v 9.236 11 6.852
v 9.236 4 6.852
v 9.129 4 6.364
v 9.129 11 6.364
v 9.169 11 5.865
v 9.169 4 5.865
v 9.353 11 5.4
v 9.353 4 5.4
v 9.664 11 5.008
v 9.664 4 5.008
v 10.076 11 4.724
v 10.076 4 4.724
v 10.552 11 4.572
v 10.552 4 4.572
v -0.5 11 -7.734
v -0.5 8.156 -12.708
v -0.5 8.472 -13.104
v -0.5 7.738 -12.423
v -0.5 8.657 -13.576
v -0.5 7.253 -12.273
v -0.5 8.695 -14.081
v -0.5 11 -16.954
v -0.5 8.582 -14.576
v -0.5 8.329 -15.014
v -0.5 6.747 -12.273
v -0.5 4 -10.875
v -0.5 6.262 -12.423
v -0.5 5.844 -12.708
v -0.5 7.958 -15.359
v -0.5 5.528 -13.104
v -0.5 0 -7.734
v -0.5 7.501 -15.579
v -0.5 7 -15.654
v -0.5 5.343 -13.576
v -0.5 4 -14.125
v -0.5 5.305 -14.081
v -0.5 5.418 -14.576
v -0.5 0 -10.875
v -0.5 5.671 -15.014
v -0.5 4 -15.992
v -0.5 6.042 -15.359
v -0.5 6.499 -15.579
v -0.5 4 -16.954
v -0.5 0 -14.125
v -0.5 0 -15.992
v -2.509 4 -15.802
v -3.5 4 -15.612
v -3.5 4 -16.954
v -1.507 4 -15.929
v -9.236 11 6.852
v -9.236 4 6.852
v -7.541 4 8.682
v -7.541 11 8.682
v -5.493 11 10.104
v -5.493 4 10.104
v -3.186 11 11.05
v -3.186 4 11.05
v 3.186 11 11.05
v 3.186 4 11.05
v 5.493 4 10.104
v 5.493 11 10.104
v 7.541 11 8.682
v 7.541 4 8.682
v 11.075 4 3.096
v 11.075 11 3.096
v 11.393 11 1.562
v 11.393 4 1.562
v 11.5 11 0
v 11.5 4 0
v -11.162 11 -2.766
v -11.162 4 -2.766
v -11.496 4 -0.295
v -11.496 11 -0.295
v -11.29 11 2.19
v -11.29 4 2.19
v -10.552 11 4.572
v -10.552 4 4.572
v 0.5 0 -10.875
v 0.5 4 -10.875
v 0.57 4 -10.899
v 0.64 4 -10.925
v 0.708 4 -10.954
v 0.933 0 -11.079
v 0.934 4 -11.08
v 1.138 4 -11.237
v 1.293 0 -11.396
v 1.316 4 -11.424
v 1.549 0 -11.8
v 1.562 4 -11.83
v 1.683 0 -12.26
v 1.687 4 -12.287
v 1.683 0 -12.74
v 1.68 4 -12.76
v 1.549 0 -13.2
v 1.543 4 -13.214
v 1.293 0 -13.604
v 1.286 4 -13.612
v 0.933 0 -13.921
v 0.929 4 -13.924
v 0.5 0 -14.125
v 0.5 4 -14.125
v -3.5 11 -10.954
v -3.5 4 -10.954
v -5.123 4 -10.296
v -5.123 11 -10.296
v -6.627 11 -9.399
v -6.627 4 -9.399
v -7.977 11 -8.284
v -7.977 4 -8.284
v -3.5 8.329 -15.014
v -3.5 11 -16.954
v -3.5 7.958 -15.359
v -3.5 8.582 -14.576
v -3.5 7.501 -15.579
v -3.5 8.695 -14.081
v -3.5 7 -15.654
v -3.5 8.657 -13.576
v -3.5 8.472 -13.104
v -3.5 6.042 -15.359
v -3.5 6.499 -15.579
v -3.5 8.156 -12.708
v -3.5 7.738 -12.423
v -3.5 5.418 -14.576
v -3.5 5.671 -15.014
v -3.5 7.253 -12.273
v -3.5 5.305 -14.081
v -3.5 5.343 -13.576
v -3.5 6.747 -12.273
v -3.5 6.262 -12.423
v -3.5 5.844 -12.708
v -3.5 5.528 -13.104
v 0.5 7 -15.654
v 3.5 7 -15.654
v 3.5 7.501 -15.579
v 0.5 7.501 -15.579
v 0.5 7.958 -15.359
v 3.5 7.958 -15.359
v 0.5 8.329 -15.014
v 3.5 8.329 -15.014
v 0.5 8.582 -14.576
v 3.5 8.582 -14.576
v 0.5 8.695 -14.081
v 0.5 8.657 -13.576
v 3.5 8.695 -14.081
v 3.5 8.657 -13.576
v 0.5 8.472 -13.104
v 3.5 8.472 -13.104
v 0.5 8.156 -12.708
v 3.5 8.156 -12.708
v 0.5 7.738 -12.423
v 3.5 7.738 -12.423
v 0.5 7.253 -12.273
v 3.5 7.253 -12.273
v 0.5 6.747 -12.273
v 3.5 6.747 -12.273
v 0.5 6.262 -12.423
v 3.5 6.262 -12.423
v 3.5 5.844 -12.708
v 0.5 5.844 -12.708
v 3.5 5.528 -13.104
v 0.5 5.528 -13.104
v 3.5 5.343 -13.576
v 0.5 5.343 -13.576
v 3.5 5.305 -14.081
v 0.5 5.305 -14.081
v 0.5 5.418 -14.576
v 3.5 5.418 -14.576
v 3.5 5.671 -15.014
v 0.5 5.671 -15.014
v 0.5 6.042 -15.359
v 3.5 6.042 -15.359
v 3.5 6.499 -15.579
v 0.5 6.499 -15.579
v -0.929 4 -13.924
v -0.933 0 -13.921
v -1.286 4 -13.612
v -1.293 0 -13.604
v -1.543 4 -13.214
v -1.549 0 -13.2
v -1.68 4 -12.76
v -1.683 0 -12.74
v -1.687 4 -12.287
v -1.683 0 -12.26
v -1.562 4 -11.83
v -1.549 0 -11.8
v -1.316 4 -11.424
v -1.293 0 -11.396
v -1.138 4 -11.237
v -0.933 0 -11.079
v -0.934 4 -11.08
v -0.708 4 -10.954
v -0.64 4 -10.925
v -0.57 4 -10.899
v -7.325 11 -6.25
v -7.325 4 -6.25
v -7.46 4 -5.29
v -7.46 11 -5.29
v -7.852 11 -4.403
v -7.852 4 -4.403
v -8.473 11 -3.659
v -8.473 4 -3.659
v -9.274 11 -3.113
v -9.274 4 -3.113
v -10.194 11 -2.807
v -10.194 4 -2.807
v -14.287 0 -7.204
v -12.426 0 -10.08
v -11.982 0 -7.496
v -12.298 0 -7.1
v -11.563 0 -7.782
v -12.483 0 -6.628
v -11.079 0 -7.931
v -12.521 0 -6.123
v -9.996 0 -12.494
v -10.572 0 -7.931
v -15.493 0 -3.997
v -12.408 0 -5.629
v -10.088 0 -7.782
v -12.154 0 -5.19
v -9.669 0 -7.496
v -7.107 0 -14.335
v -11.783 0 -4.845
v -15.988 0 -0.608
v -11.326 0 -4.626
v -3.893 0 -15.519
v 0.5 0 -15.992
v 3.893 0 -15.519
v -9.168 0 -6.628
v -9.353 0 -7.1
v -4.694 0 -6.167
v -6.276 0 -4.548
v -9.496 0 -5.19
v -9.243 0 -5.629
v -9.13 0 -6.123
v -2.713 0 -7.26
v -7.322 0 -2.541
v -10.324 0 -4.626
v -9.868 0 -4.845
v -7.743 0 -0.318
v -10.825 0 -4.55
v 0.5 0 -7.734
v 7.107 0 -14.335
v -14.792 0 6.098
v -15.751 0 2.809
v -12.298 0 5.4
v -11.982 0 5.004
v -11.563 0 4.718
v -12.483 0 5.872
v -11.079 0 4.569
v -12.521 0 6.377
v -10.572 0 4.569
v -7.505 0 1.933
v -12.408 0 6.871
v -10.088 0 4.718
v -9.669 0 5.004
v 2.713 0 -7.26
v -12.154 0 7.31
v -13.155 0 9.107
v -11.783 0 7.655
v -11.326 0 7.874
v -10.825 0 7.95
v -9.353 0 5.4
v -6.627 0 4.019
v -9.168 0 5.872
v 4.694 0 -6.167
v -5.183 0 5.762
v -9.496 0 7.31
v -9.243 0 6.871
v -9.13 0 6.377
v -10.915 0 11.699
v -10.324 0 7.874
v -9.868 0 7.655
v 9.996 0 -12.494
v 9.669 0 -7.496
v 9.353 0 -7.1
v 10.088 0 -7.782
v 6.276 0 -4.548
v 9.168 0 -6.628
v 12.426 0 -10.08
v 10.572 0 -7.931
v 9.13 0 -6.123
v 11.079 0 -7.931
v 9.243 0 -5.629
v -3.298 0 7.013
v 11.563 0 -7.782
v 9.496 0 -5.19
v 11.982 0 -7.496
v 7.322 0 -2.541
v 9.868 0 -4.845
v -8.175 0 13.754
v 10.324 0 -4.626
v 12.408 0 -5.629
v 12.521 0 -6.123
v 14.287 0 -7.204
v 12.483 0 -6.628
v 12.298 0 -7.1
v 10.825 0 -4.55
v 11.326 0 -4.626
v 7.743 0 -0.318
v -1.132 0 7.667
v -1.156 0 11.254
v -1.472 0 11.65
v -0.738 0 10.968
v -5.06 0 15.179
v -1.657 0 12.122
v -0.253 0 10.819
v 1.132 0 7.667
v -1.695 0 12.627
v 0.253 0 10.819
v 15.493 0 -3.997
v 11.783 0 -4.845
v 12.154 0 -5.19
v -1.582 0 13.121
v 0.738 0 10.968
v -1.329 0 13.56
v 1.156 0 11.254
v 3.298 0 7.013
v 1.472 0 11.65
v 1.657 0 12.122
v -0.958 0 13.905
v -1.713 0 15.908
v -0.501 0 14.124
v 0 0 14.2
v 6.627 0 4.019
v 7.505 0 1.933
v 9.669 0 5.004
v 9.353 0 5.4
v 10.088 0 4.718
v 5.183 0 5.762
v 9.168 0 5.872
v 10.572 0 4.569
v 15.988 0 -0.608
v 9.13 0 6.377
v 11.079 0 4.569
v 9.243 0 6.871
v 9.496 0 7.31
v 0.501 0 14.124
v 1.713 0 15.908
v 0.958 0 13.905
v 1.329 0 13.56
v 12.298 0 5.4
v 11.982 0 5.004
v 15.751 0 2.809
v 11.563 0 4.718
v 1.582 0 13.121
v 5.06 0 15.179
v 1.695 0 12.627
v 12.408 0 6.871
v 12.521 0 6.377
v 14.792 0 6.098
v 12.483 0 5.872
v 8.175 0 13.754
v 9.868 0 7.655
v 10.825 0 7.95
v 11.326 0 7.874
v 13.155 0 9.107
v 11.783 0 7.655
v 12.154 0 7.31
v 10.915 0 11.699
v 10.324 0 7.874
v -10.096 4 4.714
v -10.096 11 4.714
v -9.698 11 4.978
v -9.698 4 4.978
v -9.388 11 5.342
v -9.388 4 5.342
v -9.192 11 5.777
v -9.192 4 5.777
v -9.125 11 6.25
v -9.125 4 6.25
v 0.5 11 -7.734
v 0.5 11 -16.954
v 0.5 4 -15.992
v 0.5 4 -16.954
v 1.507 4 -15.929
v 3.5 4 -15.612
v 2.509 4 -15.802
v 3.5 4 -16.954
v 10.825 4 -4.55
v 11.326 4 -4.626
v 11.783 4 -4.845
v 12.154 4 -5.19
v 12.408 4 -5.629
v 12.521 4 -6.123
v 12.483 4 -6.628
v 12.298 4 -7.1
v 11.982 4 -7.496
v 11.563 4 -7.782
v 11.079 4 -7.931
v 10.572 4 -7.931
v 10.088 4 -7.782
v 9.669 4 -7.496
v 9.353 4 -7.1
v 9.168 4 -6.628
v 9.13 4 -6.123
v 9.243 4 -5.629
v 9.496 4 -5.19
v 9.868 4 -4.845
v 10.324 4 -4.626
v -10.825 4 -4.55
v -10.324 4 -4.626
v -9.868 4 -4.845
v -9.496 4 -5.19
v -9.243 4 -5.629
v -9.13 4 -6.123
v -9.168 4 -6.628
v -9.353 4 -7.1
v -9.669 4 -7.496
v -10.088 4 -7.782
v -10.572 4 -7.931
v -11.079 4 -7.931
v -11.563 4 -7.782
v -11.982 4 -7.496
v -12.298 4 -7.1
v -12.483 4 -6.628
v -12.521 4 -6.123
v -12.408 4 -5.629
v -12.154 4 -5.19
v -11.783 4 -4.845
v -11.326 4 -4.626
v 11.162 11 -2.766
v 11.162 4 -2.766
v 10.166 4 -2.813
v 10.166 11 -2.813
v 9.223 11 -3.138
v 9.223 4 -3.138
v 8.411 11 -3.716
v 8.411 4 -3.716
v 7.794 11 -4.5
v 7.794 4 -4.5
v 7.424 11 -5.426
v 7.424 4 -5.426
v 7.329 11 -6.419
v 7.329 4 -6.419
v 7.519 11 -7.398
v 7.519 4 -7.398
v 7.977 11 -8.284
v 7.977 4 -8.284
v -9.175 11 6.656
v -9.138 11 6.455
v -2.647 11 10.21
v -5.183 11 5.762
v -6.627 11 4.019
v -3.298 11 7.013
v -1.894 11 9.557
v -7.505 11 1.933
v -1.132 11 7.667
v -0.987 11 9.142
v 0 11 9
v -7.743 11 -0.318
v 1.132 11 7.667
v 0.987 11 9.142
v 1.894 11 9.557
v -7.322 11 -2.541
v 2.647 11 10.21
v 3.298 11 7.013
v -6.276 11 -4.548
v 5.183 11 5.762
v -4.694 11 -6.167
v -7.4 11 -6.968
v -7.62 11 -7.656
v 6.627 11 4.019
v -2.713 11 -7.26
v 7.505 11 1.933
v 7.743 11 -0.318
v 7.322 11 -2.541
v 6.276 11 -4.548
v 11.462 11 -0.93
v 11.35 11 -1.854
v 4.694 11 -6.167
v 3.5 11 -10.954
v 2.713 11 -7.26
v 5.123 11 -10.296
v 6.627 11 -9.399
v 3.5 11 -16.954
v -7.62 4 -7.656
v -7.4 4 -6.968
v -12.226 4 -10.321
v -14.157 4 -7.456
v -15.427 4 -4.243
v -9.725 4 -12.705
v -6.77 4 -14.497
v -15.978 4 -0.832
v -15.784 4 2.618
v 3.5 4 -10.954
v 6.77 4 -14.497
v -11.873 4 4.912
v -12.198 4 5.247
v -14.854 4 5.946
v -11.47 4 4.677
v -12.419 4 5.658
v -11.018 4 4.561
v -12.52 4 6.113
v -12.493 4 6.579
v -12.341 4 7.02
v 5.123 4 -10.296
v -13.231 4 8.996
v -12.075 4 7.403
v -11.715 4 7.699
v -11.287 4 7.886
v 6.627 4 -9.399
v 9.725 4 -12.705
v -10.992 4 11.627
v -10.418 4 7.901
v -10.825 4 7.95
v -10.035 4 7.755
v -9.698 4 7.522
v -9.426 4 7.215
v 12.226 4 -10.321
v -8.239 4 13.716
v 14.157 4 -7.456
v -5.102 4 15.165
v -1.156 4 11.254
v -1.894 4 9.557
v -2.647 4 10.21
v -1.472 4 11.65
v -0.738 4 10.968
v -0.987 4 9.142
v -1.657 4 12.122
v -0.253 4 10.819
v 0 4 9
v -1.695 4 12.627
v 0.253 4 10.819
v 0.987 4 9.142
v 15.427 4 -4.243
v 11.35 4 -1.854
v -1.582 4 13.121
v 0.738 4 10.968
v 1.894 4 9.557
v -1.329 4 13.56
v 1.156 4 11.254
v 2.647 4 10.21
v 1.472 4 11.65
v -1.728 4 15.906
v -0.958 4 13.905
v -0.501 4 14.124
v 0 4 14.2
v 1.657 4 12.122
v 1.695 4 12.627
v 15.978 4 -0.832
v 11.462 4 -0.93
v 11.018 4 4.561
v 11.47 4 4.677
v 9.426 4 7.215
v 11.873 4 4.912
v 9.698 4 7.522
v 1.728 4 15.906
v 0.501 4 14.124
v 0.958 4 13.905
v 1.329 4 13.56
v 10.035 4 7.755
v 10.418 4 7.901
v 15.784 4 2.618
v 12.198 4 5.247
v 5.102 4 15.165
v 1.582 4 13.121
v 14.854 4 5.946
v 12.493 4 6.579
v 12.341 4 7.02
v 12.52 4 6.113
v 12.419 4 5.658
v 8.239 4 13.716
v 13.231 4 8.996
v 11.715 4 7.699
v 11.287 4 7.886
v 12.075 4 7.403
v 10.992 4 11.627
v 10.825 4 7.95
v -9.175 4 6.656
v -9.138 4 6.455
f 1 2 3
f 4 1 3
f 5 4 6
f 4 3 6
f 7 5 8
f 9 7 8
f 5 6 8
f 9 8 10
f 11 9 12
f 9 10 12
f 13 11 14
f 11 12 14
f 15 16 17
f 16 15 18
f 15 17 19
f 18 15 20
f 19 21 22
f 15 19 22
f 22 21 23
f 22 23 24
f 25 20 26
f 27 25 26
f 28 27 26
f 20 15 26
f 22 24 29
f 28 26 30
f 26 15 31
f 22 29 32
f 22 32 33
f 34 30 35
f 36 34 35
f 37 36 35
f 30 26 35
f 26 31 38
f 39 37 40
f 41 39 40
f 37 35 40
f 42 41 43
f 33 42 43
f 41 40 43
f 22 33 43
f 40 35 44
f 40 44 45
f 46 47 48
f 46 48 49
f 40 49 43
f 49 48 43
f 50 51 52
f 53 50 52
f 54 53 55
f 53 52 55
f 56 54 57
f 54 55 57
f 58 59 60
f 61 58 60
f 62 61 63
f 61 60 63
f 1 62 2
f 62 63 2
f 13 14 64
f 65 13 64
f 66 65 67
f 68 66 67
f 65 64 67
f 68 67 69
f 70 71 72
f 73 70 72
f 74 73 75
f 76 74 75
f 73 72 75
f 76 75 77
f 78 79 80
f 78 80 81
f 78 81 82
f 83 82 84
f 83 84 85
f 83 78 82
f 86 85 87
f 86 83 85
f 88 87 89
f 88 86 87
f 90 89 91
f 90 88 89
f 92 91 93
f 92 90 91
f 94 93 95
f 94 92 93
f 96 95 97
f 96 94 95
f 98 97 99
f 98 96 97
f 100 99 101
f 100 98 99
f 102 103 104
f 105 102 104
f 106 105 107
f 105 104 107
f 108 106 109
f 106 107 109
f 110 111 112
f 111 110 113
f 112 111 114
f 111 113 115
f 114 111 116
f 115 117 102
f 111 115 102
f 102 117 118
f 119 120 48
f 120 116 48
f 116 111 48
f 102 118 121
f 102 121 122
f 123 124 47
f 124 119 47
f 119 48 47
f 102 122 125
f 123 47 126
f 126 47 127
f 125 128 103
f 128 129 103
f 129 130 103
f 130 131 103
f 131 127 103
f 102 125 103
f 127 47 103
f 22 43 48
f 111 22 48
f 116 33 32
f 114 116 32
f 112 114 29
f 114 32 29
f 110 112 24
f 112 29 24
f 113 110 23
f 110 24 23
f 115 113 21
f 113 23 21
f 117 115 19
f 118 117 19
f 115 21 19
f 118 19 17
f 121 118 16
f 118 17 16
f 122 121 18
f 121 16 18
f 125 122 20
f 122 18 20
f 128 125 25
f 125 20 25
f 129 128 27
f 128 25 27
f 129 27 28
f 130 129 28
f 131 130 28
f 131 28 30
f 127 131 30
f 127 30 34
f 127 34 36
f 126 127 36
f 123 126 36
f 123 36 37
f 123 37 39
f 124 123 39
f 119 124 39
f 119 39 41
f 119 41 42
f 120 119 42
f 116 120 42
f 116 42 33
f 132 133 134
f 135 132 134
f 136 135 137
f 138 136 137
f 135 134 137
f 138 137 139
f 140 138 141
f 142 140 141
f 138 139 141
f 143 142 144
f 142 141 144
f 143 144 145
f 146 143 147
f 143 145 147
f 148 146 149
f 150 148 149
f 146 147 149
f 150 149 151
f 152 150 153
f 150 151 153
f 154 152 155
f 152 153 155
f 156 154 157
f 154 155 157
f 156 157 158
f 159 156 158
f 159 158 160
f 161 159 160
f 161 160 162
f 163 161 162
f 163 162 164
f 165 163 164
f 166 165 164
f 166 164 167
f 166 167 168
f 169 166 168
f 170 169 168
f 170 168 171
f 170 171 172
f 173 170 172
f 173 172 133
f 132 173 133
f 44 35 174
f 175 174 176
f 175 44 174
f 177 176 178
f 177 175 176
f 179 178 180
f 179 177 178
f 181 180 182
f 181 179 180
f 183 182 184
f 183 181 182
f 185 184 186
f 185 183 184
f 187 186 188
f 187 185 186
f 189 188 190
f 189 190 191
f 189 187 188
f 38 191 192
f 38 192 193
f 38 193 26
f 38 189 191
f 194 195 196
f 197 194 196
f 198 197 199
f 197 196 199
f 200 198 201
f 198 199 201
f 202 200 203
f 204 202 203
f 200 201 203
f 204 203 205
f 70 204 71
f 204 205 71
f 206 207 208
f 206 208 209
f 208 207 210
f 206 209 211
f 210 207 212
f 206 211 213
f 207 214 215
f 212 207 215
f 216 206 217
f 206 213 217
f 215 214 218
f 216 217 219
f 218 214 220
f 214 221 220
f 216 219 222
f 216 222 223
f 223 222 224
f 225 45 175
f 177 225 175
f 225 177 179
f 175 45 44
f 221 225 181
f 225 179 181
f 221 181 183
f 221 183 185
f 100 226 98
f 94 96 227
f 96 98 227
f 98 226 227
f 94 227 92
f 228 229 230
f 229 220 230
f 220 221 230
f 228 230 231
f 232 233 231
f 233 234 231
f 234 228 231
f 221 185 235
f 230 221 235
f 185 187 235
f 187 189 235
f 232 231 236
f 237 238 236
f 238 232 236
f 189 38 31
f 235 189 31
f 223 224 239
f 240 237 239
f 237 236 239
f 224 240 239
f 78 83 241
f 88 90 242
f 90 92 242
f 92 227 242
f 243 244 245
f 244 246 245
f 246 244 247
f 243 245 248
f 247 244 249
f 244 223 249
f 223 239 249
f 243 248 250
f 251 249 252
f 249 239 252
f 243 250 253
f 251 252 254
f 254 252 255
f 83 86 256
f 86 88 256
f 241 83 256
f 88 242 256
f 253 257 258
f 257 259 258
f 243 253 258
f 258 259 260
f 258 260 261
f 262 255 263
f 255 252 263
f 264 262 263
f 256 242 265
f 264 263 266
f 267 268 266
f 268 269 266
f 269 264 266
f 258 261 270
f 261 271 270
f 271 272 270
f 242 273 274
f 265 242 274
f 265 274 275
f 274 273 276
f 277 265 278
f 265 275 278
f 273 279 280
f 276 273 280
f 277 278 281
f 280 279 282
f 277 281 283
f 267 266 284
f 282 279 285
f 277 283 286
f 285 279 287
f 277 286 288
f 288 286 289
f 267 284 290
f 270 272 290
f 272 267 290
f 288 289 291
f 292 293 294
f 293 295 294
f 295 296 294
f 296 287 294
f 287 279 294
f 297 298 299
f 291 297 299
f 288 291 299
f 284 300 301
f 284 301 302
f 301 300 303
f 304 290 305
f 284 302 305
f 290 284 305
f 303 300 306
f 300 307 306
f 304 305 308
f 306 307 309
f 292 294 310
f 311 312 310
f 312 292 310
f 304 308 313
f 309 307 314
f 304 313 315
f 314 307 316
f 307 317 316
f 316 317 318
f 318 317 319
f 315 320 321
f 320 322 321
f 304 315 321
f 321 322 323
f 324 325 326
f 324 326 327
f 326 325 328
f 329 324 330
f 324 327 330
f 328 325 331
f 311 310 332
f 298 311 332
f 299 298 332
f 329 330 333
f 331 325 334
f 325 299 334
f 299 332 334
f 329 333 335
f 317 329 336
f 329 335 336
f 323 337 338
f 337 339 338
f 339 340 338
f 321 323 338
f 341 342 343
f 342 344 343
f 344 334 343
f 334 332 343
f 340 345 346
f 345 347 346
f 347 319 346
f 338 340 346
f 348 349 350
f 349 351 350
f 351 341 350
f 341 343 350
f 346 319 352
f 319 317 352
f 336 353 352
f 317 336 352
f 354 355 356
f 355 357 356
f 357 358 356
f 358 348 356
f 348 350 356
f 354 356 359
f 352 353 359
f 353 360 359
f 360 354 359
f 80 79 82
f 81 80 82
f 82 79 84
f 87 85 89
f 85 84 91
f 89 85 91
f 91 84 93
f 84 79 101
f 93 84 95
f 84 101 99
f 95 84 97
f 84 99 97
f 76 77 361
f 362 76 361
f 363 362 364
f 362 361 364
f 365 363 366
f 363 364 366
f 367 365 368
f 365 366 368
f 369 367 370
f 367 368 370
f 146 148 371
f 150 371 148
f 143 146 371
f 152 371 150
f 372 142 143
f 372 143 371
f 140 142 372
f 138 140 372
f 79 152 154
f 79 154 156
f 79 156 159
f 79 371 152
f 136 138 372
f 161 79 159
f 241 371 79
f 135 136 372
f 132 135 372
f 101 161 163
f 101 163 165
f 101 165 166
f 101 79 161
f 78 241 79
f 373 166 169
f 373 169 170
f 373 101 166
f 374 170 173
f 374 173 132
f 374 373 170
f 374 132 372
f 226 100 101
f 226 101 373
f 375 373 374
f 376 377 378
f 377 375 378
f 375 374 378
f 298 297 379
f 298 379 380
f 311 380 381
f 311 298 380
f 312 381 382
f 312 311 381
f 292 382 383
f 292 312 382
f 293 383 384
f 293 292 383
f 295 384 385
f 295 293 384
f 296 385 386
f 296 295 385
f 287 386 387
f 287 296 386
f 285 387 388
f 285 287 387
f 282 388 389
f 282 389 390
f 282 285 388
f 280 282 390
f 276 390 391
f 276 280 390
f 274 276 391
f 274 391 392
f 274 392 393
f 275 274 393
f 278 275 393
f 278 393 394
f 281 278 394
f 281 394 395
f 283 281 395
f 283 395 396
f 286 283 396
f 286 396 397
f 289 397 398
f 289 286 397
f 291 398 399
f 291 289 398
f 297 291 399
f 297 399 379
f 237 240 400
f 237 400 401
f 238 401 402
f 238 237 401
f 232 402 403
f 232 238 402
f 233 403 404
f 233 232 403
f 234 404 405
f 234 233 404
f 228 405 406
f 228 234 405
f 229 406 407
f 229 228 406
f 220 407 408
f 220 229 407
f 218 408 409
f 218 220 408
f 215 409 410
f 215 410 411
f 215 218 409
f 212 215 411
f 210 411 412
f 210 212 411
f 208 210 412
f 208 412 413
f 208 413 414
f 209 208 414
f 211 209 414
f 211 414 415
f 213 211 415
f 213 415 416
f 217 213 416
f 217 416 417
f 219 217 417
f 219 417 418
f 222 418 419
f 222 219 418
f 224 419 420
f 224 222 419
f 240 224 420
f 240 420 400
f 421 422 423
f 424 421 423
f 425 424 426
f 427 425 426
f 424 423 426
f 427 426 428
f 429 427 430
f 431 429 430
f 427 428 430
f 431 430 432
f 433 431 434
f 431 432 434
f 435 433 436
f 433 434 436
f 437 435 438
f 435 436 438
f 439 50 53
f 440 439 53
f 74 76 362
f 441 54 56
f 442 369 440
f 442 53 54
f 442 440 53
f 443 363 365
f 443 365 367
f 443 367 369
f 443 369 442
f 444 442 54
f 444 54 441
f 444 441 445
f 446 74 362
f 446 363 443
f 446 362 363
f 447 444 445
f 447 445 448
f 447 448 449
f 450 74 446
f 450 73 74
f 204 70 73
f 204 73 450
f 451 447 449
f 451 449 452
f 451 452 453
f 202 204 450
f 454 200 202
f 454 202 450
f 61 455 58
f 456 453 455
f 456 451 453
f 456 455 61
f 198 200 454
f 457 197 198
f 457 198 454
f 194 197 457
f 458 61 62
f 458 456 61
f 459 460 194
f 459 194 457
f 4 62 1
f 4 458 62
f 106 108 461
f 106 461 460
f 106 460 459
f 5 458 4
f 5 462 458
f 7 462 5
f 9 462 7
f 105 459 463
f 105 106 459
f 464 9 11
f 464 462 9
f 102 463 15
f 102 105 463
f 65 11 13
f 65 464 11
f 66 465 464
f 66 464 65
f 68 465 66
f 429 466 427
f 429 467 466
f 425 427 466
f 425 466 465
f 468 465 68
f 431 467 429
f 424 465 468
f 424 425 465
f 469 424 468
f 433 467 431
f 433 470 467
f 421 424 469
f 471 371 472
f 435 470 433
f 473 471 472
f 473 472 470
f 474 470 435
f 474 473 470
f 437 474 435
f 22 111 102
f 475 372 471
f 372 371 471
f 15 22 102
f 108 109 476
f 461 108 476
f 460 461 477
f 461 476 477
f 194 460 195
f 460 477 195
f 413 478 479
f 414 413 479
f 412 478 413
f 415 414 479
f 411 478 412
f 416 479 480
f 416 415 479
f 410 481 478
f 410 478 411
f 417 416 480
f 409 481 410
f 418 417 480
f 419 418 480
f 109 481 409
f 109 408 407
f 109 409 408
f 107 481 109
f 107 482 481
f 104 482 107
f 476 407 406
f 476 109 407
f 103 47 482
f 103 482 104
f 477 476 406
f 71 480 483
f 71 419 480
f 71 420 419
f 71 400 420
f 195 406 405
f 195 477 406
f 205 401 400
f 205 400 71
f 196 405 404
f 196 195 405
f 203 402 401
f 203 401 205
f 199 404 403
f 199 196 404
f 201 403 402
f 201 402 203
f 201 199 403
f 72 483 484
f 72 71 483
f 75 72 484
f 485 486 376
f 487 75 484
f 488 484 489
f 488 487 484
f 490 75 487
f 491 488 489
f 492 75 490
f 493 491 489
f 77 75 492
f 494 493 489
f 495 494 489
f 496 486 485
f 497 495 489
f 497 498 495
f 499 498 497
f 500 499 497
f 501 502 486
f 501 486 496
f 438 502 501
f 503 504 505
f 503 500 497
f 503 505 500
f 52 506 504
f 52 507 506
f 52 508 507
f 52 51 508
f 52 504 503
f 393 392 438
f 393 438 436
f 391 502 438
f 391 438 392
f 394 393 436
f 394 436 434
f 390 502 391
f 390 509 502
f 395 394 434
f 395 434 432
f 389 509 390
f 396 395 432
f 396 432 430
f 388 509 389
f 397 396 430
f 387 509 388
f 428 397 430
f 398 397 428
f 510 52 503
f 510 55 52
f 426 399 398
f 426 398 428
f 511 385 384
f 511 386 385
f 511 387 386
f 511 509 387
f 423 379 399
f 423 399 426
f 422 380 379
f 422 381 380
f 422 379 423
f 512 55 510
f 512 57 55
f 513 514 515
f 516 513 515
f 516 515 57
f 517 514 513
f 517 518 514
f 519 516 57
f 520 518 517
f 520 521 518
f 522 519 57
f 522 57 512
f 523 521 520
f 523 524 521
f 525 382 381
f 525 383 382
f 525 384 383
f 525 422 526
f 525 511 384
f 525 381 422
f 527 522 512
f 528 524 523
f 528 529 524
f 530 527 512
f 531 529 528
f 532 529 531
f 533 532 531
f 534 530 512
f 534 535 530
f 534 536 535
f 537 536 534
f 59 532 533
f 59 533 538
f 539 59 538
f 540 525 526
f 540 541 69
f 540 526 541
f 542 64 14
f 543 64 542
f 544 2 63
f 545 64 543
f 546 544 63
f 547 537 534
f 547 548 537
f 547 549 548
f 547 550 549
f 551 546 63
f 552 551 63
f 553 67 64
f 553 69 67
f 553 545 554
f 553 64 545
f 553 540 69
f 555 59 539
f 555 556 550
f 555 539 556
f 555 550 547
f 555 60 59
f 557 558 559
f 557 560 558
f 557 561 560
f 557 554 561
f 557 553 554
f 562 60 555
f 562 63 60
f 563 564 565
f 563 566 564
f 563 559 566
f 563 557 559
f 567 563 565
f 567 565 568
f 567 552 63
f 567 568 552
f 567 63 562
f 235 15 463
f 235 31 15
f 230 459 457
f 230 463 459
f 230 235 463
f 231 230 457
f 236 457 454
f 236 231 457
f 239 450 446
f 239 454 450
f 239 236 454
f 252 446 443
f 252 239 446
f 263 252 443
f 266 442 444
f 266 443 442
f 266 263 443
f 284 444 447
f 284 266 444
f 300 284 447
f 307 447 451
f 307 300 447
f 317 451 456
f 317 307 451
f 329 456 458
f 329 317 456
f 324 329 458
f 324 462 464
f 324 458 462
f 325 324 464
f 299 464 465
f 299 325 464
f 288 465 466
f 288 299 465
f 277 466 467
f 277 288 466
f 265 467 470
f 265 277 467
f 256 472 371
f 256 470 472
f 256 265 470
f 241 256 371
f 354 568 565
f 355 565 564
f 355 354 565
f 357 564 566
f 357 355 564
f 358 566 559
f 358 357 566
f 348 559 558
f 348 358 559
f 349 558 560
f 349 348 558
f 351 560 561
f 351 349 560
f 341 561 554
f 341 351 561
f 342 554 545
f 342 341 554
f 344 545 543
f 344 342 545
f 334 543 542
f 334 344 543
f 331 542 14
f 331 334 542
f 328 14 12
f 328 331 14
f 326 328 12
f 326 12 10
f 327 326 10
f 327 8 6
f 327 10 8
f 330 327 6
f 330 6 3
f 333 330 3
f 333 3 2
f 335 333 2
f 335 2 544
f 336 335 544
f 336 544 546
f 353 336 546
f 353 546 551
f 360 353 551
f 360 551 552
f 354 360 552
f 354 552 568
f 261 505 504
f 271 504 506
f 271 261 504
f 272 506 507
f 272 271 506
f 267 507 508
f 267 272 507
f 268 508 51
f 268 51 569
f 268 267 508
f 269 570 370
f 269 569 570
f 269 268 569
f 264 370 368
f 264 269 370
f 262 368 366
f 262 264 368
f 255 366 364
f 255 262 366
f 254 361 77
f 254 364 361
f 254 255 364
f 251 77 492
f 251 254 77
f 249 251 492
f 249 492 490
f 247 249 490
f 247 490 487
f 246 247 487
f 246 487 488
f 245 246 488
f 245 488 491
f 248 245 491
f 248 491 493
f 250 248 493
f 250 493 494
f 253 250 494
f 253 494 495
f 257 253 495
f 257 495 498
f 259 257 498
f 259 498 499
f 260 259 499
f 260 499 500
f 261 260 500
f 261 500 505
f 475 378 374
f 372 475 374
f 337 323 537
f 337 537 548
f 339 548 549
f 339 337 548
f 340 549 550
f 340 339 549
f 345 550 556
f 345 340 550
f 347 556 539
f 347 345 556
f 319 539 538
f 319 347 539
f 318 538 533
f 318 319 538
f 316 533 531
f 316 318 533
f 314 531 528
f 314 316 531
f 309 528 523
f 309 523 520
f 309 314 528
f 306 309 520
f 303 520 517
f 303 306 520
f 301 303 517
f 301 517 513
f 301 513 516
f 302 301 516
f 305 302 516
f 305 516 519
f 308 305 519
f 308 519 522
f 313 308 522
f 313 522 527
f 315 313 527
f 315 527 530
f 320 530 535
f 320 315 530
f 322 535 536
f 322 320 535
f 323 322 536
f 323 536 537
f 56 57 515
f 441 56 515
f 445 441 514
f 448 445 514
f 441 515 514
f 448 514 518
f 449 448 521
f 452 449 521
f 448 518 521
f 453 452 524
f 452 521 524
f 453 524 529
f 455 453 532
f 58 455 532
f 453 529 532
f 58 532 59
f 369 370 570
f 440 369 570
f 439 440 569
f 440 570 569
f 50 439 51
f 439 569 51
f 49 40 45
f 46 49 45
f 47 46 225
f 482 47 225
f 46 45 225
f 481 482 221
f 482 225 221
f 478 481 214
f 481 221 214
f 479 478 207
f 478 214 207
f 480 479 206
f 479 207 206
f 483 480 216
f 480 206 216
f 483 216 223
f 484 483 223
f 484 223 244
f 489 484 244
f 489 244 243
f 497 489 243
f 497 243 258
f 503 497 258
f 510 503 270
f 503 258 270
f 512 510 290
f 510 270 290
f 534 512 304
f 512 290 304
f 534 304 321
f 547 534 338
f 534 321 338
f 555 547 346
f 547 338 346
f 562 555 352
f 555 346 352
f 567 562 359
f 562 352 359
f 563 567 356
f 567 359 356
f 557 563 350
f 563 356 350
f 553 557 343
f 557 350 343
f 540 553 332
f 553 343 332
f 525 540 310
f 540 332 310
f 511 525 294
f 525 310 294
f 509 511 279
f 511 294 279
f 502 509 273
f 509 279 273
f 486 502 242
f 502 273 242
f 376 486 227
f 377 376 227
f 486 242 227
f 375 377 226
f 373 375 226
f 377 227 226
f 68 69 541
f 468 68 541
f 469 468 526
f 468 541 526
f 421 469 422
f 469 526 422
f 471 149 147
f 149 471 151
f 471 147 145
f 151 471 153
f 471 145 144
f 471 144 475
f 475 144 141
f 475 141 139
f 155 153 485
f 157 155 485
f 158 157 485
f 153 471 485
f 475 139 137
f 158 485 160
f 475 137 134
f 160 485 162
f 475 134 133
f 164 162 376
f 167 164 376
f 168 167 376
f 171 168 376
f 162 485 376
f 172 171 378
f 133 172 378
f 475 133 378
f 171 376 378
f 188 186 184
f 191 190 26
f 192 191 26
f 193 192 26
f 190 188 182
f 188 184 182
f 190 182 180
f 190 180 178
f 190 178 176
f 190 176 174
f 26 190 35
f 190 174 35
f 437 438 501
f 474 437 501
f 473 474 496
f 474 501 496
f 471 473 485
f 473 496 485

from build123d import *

# Parameters (mm, degrees)
SKETCH_1_R          = 16
SKETCH_1_R_2        = 7.75
SKETCH_1_R_3        = 1.7
EXTRUDE_1_DEPTH     = 4
SKETCH_2_R          = 7.75
EXTRUDE_2_DEPTH     = 7
CUT_EXTRUDE_START   = -11
SKETCH_3_W          = 1
SKETCH_3_H          = 8.04554885
SKETCH_3_H_2        = 6
CUT_EXTRUDE_1_DEPTH = 11
EXTRUDE_START       = -7
EXTRUDE_3_DEPTH     = 7
SKETCH_4_R          = 1.7
CUT_EXTRUDE_2_DEPTH = 8


with BuildPart() as part:
    # 草图1 → 凸台-拉伸1 (new body)
    with BuildSketch(Plane(origin=(0, 0, 0), x_dir=(1, 0, 0), z_dir=(0, 1, 0))):
        with Locations(Location((0, 0, 0), (0, 0, 270))):
            Circle(SKETCH_1_R)
        with Locations(Location((0, 0, 0), (0, 0, 270))):
            Circle(SKETCH_1_R_2, mode=Mode.SUBTRACT)
        with Locations(Location((0, 12.5, 0), (0, 0, 270))):
            Circle(SKETCH_1_R_3, mode=Mode.SUBTRACT)
        with Locations(Location((10.825317547, 6.25, 0), (0, 0, 270))):
            Circle(SKETCH_1_R_3, mode=Mode.SUBTRACT)
        with Locations(Location((10.825317547, -6.25, 0), (0, 0, 270))):
            Circle(SKETCH_1_R_3, mode=Mode.SUBTRACT)
        with Locations(Location((0, -12.5, 0), (0, 0, 270))):
            Circle(SKETCH_1_R_3, mode=Mode.SUBTRACT)
        with Locations(Location((-10.825317547, -6.25, 0), (0, 0, 270))):
            Circle(SKETCH_1_R_3, mode=Mode.SUBTRACT)
        with Locations(Location((-10.825317547, 6.25, 0), (0, 0, 270))):
            Circle(SKETCH_1_R_3, mode=Mode.SUBTRACT)
    extrude(amount=EXTRUDE_1_DEPTH)

    # 草图2 → 凸台-拉伸2 (add)
    with BuildSketch(Plane(origin=(0, 4, 0), x_dir=(1, 0, 0), z_dir=(0, 1, 0))):
        with BuildLine():
            ThreePointArc((-3.185514087, -11.05), (0, -9), (3.185514087, -11.05))
            ThreePointArc((3.185514087, -11.05), (6.555617772, -9.448485362), (9.23558726, -6.852293628))
            ThreePointArc((9.23558726, -6.852293628), (9.353074361, -5.4), (10.552053986, -4.572106372))
            ThreePointArc((10.552053986, -4.572106372), (11.260519989, -2.334671193), (11.5, 0))
            ThreePointArc((11.5, 0), (11.415272318, 1.393397971), (11.162337755, 2.766263876))
            ThreePointArc((11.162337755, 2.766263876), (7.794228634, 4.5), (7.976823668, 8.283736124))
            ThreePointArc((7.976823668, 8.283736124), (4.904819465, 10.401574209), (1.316466726, 11.4244))
            ThreePointArc((1.316466726, 11.4244), (0, 10.8), (-1.316466726, 11.4244))
            ThreePointArc((-1.316466726, 11.4244), (-4.904819465, 10.401574209), (-7.976823668, 8.283736124))
            ThreePointArc((-7.976823668, 8.283736124), (-7.492171243, 7.317771376), (-7.325317547, 6.25))
            ThreePointArc((-7.325317547, 6.25), (-8.472613861, 3.658709711), (-11.162337755, 2.766263876))
            ThreePointArc((-11.162337755, 2.766263876), (-11.460437236, -0.953088847), (-10.552053986, -4.572106372))
            ThreePointArc((-10.552053986, -4.572106372), (-9.530221401, -5.148761619), (-9.125317547, -6.25))
            ThreePointArc((-9.125317547, -6.25), (-9.153112194, -6.556152341), (-9.23558726, -6.852293628))
            ThreePointArc((-9.23558726, -6.852293628), (-6.555617772, -9.448485362), (-3.185514087, -11.05))
        make_face()
        with Locations(Location((0, 0, 0), (0, 0, 270))):
            Circle(SKETCH_2_R, mode=Mode.SUBTRACT)
    extrude(amount=EXTRUDE_2_DEPTH)

    # 草图3 → 切除-拉伸1 (cut)
    with BuildSketch(Plane(origin=(0, 11, 0), x_dir=(1, 0, 0), z_dir=(0, 1, 0)).offset(CUT_EXTRUDE_START)):
        with BuildLine():
            Line((0.5, -7.733854149), (0.5, 0))
            Line((0.5, 0), (-0.5, 0))
            Line((-0.5, 0), (-0.5, -7.733854149))
            ThreePointArc((-0.5, -7.733854149), (0, -7.75), (0.5, -7.733854149))
        make_face()
        with BuildLine():
            Line((-0.5, 0), (0.5, 0))
            Line((0.5, 0), (0.5, 7.733854149))
            ThreePointArc((0.5, 7.733854149), (0, 7.75), (-0.5, 7.733854149))
            Line((-0.5, 7.733854149), (-0.5, 0))
        make_face()
        with Locations((0, 20.977225575)):
            Rectangle(SKETCH_3_W, SKETCH_3_H)
        with Locations((0, 13.95445115)):
            Rectangle(SKETCH_3_W, SKETCH_3_H_2)
        with BuildLine():
            ThreePointArc((-0.5, 7.733854149), (0, 7.75), (0.5, 7.733854149))
            Line((0.5, 7.733854149), (0.5, 10.875192319))
            ThreePointArc((0.5, 10.875192319), (0, 10.8), (-0.5, 10.875192319))
            Line((-0.5, 10.875192319), (-0.5, 7.733854149))
        make_face()
    extrude(amount=CUT_EXTRUDE_1_DEPTH, mode=Mode.SUBTRACT)

    # 草图3<3> → 凸台-拉伸3 (add)
    with BuildSketch(Plane(origin=(0, 11, 0), x_dir=(1, 0, 0), z_dir=(0, 1, 0)).offset(EXTRUDE_START)):
        with BuildLine():
            Line((-0.708010418, 10.95445115), (-0.5, 10.95445115))
            Line((-0.5, 10.95445115), (-0.5, 16.95445115))
            Line((-0.5, 16.95445115), (-3.5, 16.95445115))
            Line((-3.5, 16.95445115), (-3.5, 10.95445115))
            ThreePointArc((-3.5, 10.95445115), (-2.419669587, 11.242561945), (-1.316466726, 11.4244))
            ThreePointArc((-1.316466726, 11.4244), (-1.039153457, 11.154578099), (-0.708010418, 10.95445115))
        make_face()
        with BuildLine():
            Line((0.5, 16.95445115), (0.5, 10.95445115))
            Line((0.5, 10.95445115), (0.708010418, 10.95445115))
            ThreePointArc((0.708010418, 10.95445115), (1.039153457, 11.154578099), (1.316466726, 11.4244))
            ThreePointArc((1.316466726, 11.4244), (2.419669587, 11.242561945), (3.5, 10.95445115))
            Line((3.5, 10.95445115), (3.5, 16.95445115))
            Line((3.5, 16.95445115), (0.5, 16.95445115))
        make_face()
        with BuildLine():
            ThreePointArc((-0.708010418, 10.95445115), (-0.605303877, 10.911413453), (-0.5, 10.875192319))
            Line((-0.5, 10.875192319), (-0.5, 10.95445115))
            Line((-0.5, 10.95445115), (-0.708010418, 10.95445115))
        make_face()
        with BuildLine():
            Line((0.5, 10.95445115), (0.5, 10.875192319))
            ThreePointArc((0.5, 10.875192319), (0.605303877, 10.911413453), (0.708010418, 10.95445115))
            Line((0.708010418, 10.95445115), (0.5, 10.95445115))
        make_face()
    extrude(amount=EXTRUDE_3_DEPTH)

    # 草图4 → 切除-拉伸2 (cut)
    with BuildSketch(Plane(origin=(3.5, 0, 0), x_dir=(0, 0, -1), z_dir=(1, 0, 0))):
        with Locations((13.95445115, 7)):
            Circle(SKETCH_4_R)
    extrude(amount=-CUT_EXTRUDE_2_DEPTH, mode=Mode.SUBTRACT)


solid = part.part
